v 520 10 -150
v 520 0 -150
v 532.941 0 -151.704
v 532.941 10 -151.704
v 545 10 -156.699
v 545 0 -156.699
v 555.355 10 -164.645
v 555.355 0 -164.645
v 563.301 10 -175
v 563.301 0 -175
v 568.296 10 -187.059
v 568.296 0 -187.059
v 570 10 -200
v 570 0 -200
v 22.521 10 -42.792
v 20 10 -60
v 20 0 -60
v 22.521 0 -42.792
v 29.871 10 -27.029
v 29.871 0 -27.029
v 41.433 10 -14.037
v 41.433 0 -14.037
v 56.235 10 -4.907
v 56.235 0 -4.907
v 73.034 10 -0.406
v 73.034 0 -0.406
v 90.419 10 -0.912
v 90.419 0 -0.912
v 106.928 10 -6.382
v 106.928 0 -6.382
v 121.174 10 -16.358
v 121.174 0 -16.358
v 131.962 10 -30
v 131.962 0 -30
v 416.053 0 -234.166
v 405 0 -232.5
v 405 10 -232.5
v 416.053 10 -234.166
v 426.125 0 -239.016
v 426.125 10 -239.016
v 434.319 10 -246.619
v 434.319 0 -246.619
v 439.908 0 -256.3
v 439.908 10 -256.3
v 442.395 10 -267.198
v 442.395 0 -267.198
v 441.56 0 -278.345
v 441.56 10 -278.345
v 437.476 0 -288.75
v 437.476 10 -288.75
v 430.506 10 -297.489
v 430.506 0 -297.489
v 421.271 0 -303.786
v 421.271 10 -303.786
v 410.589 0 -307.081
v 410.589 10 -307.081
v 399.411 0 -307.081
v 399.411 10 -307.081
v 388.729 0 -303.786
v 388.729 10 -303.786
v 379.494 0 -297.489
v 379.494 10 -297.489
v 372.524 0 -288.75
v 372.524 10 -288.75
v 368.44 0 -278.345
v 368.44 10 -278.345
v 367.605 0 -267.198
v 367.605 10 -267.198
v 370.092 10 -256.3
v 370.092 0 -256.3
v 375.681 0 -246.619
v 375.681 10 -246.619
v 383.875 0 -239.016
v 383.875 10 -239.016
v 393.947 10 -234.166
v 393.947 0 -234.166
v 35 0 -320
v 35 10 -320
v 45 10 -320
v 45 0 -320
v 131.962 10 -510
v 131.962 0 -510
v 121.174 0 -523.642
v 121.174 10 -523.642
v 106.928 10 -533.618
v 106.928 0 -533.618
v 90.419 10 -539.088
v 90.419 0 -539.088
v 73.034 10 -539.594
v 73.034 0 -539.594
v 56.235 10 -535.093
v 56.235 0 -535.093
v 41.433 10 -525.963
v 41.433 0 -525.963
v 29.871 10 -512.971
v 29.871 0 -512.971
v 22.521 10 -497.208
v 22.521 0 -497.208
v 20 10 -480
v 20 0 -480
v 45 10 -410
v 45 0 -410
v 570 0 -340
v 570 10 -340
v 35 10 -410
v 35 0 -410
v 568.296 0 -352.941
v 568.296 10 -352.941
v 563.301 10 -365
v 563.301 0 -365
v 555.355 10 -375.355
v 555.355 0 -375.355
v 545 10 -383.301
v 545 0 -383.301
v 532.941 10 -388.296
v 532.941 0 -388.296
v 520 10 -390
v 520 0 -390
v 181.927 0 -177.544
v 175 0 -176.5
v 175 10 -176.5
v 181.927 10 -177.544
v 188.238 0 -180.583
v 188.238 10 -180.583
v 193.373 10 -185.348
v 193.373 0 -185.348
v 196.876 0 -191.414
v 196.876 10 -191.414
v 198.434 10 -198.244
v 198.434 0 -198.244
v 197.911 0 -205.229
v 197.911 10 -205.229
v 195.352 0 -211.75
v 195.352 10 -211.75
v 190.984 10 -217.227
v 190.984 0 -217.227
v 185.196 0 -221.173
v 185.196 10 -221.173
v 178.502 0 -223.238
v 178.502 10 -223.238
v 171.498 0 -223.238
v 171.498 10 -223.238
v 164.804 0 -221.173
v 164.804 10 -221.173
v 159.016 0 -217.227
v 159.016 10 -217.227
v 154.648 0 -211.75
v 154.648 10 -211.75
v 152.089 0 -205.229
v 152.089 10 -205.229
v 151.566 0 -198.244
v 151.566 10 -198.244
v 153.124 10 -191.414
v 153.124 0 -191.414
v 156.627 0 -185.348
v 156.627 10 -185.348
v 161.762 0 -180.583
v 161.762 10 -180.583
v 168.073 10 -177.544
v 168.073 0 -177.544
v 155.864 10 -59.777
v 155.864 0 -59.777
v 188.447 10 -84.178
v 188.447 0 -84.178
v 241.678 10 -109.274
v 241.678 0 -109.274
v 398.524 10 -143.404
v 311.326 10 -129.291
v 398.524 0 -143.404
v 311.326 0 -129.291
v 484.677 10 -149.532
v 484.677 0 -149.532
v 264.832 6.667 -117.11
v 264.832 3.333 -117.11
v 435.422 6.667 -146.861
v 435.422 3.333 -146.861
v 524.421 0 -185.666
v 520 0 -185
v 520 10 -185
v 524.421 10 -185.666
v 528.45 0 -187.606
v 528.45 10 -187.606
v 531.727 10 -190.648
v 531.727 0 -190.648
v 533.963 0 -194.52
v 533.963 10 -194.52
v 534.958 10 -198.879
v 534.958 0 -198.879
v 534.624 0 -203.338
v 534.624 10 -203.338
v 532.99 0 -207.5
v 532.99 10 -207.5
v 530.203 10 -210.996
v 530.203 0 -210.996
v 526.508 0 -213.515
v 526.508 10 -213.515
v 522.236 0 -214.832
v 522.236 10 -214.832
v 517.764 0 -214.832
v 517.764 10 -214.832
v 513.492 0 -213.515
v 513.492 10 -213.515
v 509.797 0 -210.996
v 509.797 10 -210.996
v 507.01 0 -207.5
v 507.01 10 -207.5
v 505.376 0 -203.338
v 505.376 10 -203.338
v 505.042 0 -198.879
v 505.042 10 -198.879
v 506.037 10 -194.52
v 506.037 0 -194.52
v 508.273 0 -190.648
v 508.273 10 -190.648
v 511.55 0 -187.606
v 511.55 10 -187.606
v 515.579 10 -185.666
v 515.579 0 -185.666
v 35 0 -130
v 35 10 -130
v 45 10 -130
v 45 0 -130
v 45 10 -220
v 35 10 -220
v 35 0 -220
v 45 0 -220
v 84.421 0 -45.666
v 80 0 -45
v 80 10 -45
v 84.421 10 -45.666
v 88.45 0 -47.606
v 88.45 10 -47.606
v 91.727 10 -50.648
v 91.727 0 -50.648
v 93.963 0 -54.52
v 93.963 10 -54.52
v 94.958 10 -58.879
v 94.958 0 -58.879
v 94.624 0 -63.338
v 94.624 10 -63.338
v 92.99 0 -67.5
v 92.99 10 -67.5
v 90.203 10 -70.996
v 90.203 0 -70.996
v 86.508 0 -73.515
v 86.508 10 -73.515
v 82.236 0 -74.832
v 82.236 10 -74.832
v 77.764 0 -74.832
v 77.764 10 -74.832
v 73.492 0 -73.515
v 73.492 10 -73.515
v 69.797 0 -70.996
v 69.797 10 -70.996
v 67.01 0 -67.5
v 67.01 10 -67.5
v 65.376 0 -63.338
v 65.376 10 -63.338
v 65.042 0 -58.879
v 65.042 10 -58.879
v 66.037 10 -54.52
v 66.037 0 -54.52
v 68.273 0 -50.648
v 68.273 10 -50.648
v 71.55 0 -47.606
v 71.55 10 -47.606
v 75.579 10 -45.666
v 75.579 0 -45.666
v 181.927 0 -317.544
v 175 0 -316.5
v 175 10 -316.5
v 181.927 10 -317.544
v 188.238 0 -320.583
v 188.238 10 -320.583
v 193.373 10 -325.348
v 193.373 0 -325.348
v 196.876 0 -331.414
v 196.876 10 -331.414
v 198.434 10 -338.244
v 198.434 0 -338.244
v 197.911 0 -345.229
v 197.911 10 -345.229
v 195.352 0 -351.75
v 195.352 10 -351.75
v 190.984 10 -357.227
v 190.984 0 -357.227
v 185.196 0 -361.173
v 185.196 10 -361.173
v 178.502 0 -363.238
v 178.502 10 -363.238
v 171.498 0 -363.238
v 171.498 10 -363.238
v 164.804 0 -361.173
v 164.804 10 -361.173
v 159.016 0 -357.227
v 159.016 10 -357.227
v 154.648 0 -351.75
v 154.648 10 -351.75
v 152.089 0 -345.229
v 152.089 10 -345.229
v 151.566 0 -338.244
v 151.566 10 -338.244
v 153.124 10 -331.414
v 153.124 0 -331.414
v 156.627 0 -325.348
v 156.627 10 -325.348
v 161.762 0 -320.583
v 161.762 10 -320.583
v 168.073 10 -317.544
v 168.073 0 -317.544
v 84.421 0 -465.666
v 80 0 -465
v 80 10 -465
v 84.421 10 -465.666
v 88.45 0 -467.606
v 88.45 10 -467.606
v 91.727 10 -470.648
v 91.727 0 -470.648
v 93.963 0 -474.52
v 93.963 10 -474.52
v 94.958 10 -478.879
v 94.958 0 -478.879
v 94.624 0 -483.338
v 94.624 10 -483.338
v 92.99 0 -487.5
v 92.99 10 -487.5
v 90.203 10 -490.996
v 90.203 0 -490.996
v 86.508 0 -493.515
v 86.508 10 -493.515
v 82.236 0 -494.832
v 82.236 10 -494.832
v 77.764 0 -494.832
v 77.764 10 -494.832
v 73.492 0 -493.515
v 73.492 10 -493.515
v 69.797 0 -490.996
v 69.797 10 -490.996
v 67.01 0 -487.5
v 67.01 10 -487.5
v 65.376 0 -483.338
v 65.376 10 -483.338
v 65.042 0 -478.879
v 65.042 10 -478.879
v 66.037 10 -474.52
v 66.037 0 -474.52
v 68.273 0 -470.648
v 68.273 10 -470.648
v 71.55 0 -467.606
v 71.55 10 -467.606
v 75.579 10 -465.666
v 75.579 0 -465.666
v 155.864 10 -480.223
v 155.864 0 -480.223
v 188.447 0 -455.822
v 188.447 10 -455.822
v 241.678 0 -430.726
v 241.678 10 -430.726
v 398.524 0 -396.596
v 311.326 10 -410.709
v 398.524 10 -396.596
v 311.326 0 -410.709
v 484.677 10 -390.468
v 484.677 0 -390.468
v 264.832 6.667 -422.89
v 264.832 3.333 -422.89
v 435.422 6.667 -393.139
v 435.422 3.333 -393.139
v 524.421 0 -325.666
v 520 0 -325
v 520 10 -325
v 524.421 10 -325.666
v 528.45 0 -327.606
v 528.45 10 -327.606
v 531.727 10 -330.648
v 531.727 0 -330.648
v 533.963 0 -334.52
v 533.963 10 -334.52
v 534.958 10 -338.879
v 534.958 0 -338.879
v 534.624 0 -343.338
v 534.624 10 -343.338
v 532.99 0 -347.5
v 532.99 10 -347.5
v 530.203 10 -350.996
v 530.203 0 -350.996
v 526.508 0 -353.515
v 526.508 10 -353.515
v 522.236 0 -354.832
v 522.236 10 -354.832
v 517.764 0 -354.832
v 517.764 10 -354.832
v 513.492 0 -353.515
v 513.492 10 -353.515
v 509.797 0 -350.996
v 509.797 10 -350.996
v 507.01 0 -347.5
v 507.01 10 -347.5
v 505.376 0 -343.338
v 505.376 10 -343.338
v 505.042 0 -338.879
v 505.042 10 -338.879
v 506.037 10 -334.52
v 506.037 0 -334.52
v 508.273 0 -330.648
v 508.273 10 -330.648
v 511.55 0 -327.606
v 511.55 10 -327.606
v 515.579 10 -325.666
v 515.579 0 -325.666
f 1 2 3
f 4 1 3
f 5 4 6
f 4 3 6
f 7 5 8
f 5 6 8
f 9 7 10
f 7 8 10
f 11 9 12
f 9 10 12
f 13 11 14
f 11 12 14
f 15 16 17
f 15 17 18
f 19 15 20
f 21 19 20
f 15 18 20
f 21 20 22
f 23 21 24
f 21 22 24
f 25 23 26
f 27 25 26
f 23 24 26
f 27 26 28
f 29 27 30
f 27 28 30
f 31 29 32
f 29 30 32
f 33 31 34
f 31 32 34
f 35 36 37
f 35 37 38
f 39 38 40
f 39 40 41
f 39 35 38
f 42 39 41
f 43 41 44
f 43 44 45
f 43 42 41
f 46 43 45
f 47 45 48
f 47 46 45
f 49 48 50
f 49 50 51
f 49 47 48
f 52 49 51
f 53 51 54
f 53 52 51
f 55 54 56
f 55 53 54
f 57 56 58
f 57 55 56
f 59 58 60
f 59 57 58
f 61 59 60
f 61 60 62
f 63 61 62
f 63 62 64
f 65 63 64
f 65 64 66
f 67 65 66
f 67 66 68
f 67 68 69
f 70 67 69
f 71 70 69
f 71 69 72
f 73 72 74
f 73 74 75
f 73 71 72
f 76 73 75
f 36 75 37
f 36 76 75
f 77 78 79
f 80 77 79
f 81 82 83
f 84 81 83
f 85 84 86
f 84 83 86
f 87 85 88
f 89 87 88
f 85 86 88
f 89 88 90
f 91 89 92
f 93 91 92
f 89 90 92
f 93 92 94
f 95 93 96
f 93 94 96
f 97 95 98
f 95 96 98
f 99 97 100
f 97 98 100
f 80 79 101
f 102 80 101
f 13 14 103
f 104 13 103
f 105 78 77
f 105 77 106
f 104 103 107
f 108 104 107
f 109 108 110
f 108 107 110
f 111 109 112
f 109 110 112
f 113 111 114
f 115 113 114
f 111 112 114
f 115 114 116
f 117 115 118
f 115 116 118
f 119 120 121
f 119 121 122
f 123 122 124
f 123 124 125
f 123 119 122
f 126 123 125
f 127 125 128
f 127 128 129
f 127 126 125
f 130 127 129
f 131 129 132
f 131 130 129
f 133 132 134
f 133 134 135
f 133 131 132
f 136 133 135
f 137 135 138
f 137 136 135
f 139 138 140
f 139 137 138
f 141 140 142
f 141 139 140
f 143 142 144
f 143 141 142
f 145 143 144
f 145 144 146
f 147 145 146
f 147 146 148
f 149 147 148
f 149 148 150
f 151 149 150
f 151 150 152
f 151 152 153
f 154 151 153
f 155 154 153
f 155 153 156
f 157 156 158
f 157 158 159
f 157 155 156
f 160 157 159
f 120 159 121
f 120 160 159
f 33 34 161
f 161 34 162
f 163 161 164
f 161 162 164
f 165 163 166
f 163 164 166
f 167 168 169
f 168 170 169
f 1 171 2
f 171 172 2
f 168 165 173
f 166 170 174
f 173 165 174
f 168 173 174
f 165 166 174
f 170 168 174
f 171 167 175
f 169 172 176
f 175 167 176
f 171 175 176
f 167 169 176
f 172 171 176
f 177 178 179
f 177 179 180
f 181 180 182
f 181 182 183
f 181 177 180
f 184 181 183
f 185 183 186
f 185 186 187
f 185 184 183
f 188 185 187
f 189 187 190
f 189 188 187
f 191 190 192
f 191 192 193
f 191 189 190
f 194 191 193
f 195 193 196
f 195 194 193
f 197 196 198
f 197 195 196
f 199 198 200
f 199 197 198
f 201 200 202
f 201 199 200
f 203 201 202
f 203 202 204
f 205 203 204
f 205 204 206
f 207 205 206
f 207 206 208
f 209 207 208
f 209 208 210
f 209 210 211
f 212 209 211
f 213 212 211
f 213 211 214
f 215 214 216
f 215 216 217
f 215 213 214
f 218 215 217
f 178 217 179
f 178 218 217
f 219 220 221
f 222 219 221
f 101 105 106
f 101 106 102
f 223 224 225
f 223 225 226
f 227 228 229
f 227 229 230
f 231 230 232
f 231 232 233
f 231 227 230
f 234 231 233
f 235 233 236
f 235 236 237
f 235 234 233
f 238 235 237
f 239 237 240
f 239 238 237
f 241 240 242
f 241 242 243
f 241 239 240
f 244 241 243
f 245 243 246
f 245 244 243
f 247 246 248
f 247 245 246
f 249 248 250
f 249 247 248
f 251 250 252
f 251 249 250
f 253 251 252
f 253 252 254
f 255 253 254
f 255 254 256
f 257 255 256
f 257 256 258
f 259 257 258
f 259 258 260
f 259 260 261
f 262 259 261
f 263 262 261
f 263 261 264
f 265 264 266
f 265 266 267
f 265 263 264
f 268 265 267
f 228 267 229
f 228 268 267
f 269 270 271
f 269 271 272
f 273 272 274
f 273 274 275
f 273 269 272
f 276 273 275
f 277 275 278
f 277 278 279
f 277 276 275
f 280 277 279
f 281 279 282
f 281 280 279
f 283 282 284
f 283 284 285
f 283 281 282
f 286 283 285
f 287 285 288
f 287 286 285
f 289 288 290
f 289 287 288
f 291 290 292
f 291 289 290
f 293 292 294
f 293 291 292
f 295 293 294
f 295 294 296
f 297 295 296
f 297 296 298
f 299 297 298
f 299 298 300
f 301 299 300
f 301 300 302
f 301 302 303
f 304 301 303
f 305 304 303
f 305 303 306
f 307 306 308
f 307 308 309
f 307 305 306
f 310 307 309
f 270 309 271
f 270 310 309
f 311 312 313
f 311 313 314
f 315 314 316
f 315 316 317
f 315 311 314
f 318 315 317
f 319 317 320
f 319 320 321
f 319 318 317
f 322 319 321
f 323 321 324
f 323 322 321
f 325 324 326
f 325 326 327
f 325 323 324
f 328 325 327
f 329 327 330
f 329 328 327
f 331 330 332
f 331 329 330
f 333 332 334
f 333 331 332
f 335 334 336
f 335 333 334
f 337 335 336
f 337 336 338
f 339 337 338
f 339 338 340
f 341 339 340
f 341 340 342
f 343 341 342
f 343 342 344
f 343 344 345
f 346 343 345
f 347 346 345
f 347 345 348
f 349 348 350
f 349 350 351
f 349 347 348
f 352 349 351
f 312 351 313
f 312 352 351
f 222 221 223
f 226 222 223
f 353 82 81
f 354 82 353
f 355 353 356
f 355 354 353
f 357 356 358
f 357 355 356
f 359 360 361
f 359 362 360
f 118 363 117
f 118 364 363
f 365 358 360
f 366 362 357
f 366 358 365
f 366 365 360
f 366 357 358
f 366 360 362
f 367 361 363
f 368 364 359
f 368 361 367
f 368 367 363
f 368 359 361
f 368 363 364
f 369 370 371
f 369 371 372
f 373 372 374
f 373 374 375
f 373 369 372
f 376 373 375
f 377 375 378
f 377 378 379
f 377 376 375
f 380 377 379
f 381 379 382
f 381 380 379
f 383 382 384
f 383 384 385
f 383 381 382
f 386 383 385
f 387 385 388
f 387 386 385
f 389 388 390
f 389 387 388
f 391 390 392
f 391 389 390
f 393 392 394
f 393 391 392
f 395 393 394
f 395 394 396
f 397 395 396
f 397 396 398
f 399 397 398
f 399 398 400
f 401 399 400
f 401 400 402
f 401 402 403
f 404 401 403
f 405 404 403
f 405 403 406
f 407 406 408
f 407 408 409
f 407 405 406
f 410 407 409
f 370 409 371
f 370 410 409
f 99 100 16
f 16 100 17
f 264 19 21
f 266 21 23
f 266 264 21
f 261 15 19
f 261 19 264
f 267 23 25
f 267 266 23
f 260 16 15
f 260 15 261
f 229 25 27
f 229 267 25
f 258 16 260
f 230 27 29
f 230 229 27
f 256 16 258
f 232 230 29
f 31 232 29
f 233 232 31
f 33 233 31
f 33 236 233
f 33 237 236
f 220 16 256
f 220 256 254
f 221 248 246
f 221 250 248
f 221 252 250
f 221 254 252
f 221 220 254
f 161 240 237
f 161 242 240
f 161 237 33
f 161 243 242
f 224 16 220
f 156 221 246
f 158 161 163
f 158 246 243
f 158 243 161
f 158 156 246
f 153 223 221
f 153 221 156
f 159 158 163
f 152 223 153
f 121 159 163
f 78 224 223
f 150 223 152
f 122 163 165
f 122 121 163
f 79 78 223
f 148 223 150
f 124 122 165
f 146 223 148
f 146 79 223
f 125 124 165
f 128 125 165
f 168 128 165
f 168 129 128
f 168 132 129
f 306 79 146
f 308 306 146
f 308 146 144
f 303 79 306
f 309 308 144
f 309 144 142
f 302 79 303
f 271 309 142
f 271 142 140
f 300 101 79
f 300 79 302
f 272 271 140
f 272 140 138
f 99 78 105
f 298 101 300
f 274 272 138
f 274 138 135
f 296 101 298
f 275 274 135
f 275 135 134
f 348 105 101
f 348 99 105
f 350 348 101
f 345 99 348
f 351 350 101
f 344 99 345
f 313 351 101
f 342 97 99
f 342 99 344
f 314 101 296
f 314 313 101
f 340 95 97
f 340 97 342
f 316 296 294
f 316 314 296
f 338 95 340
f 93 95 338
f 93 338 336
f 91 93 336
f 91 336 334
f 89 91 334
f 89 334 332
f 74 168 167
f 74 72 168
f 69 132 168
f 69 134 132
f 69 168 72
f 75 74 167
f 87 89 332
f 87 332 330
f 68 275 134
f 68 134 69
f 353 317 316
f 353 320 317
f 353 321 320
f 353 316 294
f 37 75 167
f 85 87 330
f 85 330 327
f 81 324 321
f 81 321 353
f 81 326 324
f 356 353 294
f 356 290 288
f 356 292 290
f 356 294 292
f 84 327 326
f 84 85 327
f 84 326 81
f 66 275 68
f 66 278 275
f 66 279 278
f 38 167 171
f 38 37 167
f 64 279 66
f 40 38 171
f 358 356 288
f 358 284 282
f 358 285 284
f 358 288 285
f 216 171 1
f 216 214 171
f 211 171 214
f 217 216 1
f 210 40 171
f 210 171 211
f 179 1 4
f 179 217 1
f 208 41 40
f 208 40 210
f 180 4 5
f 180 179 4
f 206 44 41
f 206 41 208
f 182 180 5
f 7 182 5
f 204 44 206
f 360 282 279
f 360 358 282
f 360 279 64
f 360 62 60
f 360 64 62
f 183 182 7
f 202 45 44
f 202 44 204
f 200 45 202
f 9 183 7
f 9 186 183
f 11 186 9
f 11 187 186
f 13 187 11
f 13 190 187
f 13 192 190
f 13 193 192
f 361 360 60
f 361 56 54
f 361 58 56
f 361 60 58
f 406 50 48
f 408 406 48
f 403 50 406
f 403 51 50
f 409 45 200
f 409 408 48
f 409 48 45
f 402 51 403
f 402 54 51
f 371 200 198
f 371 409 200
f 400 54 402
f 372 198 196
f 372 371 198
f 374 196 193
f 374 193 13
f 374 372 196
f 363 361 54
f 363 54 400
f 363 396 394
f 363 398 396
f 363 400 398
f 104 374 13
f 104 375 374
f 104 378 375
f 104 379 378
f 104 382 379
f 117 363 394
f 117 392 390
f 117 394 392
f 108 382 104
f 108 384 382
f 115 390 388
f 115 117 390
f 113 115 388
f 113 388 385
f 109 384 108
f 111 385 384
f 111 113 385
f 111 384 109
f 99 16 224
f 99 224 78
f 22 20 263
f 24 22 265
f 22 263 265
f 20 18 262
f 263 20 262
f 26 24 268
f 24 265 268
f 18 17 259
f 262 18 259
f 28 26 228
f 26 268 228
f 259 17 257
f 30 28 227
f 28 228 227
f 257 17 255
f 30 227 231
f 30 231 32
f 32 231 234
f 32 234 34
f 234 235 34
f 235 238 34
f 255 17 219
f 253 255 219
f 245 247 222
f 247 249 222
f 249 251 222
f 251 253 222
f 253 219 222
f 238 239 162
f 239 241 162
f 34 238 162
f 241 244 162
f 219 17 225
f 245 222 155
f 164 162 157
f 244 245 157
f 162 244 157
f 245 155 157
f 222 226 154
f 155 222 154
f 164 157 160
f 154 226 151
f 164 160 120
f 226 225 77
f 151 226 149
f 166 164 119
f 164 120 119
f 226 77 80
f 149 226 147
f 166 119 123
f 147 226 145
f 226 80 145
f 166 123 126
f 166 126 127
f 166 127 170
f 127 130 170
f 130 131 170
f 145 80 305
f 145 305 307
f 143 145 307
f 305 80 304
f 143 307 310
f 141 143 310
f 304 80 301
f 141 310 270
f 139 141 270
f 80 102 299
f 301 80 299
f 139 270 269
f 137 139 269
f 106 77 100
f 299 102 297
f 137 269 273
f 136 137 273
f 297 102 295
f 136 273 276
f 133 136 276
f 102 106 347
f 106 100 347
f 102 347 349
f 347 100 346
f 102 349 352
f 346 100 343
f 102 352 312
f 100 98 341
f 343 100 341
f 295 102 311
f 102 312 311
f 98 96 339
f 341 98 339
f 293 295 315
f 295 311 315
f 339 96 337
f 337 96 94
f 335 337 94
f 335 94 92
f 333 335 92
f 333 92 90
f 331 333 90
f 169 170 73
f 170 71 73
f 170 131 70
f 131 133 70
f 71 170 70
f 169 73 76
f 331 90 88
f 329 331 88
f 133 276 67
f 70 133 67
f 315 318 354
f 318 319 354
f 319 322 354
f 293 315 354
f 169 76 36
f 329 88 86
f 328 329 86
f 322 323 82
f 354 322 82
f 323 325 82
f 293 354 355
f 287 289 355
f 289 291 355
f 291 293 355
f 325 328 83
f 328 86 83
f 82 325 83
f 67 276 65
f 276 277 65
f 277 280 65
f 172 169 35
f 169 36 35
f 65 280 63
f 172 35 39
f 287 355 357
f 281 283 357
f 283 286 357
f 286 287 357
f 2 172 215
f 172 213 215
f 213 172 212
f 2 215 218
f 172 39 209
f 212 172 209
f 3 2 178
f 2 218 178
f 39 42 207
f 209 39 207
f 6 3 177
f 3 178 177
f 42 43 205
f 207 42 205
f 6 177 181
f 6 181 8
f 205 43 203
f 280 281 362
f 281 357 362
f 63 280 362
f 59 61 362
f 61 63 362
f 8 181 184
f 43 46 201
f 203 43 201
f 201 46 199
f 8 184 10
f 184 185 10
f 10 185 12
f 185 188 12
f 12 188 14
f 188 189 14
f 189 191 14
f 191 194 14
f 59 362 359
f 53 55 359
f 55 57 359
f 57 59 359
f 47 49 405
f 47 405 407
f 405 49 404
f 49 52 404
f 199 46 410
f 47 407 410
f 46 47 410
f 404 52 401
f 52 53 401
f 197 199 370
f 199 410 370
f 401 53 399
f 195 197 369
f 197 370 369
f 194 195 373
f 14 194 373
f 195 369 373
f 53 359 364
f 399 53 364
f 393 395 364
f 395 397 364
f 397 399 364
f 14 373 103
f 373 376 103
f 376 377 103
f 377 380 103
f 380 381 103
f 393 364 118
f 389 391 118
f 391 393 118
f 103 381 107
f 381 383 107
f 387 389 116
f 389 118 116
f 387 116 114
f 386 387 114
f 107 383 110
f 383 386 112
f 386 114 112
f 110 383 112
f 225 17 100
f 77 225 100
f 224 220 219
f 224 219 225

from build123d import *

# Parameters (mm, degrees)
ESQUISSE1_R             = 37.5
ESQUISSE1_R_2           = 15
ESQUISSE1_R_3           = 23.5
BOSS_EXTRU_2_DEPTH      = 10
ESQUISSE2_W             = 10
ESQUISSE2_H             = 90
ENL_V_MAT_EXTRU_1_DEPTH = 10


with BuildPart() as part:
    # Esquisse1 → Boss.-Extru.2 (new body)
    with BuildSketch(Plane(origin=(0, 0, 0), x_dir=(1, 0, 0), z_dir=(0, 1, 0))):
        with BuildLine():
            Line((20, 480), (20, 60))
            ThreePointArc((20, 60), (64.470857294, 2.044450423), (131.961524227, 30))
            add(Edge.make_bspline(
                [(131.961524227, 30), (204.728797974, 156.036615257), (519.671151051, 149.91974963), (520, 150)],
                knots=[0, 0, 0, 0, 1, 1, 1, 1], degree=3))
            ThreePointArc((520, 150), (555.355339059, 164.644660941), (570, 200))
            Line((570, 200), (570, 340))
            ThreePointArc((570, 340), (555.355339059, 375.355339059), (520, 390))
            add(Edge.make_bspline(
                [(131.961524227, 510), (204.728797974, 383.963384743), (519.671151051, 390.08025037), (520, 390)],
                knots=[0, 0, 0, 0, 1, 1, 1, 1], degree=3))
            ThreePointArc((131.961524227, 510), (64.470857294, 537.955549577), (20, 480))
        make_face()
        with Locations(Location((405, 270, 0), (0, 0, 270))):
            Circle(ESQUISSE1_R, mode=Mode.SUBTRACT)
        with Locations(Location((520, 200, 0), (0, 0, 270))):
            Circle(ESQUISSE1_R_2, mode=Mode.SUBTRACT)
        with Locations(Location((520, 340, 0), (0, 0, 270))):
            Circle(ESQUISSE1_R_2, mode=Mode.SUBTRACT)
        with Locations(Location((80, 480, 0), (0, 0, 270))):
            Circle(ESQUISSE1_R_2, mode=Mode.SUBTRACT)
        with Locations(Location((80, 60, 0), (0, 0, 270))):
            Circle(ESQUISSE1_R_2, mode=Mode.SUBTRACT)
        with Locations(Location((175, 340, 0), (0, 0, 270))):
            Circle(ESQUISSE1_R_3, mode=Mode.SUBTRACT)
        with Locations(Location((175, 200, 0), (0, 0, 270))):
            Circle(ESQUISSE1_R_3, mode=Mode.SUBTRACT)
    extrude(amount=BOSS_EXTRU_2_DEPTH)

    # Esquisse2 → Enlèv. mat.-Extru.1 (cut)
    with BuildSketch(Plane(origin=(0, 10, 0), x_dir=(1, 0, 0), z_dir=(0, 1, 0))):
        with Locations((40, 175)):
            Rectangle(ESQUISSE2_W, ESQUISSE2_H)
        with Locations((40, 365)):
            Rectangle(ESQUISSE2_W, ESQUISSE2_H)
    extrude(amount=-ENL_V_MAT_EXTRU_1_DEPTH, mode=Mode.SUBTRACT)


solid = part.part
